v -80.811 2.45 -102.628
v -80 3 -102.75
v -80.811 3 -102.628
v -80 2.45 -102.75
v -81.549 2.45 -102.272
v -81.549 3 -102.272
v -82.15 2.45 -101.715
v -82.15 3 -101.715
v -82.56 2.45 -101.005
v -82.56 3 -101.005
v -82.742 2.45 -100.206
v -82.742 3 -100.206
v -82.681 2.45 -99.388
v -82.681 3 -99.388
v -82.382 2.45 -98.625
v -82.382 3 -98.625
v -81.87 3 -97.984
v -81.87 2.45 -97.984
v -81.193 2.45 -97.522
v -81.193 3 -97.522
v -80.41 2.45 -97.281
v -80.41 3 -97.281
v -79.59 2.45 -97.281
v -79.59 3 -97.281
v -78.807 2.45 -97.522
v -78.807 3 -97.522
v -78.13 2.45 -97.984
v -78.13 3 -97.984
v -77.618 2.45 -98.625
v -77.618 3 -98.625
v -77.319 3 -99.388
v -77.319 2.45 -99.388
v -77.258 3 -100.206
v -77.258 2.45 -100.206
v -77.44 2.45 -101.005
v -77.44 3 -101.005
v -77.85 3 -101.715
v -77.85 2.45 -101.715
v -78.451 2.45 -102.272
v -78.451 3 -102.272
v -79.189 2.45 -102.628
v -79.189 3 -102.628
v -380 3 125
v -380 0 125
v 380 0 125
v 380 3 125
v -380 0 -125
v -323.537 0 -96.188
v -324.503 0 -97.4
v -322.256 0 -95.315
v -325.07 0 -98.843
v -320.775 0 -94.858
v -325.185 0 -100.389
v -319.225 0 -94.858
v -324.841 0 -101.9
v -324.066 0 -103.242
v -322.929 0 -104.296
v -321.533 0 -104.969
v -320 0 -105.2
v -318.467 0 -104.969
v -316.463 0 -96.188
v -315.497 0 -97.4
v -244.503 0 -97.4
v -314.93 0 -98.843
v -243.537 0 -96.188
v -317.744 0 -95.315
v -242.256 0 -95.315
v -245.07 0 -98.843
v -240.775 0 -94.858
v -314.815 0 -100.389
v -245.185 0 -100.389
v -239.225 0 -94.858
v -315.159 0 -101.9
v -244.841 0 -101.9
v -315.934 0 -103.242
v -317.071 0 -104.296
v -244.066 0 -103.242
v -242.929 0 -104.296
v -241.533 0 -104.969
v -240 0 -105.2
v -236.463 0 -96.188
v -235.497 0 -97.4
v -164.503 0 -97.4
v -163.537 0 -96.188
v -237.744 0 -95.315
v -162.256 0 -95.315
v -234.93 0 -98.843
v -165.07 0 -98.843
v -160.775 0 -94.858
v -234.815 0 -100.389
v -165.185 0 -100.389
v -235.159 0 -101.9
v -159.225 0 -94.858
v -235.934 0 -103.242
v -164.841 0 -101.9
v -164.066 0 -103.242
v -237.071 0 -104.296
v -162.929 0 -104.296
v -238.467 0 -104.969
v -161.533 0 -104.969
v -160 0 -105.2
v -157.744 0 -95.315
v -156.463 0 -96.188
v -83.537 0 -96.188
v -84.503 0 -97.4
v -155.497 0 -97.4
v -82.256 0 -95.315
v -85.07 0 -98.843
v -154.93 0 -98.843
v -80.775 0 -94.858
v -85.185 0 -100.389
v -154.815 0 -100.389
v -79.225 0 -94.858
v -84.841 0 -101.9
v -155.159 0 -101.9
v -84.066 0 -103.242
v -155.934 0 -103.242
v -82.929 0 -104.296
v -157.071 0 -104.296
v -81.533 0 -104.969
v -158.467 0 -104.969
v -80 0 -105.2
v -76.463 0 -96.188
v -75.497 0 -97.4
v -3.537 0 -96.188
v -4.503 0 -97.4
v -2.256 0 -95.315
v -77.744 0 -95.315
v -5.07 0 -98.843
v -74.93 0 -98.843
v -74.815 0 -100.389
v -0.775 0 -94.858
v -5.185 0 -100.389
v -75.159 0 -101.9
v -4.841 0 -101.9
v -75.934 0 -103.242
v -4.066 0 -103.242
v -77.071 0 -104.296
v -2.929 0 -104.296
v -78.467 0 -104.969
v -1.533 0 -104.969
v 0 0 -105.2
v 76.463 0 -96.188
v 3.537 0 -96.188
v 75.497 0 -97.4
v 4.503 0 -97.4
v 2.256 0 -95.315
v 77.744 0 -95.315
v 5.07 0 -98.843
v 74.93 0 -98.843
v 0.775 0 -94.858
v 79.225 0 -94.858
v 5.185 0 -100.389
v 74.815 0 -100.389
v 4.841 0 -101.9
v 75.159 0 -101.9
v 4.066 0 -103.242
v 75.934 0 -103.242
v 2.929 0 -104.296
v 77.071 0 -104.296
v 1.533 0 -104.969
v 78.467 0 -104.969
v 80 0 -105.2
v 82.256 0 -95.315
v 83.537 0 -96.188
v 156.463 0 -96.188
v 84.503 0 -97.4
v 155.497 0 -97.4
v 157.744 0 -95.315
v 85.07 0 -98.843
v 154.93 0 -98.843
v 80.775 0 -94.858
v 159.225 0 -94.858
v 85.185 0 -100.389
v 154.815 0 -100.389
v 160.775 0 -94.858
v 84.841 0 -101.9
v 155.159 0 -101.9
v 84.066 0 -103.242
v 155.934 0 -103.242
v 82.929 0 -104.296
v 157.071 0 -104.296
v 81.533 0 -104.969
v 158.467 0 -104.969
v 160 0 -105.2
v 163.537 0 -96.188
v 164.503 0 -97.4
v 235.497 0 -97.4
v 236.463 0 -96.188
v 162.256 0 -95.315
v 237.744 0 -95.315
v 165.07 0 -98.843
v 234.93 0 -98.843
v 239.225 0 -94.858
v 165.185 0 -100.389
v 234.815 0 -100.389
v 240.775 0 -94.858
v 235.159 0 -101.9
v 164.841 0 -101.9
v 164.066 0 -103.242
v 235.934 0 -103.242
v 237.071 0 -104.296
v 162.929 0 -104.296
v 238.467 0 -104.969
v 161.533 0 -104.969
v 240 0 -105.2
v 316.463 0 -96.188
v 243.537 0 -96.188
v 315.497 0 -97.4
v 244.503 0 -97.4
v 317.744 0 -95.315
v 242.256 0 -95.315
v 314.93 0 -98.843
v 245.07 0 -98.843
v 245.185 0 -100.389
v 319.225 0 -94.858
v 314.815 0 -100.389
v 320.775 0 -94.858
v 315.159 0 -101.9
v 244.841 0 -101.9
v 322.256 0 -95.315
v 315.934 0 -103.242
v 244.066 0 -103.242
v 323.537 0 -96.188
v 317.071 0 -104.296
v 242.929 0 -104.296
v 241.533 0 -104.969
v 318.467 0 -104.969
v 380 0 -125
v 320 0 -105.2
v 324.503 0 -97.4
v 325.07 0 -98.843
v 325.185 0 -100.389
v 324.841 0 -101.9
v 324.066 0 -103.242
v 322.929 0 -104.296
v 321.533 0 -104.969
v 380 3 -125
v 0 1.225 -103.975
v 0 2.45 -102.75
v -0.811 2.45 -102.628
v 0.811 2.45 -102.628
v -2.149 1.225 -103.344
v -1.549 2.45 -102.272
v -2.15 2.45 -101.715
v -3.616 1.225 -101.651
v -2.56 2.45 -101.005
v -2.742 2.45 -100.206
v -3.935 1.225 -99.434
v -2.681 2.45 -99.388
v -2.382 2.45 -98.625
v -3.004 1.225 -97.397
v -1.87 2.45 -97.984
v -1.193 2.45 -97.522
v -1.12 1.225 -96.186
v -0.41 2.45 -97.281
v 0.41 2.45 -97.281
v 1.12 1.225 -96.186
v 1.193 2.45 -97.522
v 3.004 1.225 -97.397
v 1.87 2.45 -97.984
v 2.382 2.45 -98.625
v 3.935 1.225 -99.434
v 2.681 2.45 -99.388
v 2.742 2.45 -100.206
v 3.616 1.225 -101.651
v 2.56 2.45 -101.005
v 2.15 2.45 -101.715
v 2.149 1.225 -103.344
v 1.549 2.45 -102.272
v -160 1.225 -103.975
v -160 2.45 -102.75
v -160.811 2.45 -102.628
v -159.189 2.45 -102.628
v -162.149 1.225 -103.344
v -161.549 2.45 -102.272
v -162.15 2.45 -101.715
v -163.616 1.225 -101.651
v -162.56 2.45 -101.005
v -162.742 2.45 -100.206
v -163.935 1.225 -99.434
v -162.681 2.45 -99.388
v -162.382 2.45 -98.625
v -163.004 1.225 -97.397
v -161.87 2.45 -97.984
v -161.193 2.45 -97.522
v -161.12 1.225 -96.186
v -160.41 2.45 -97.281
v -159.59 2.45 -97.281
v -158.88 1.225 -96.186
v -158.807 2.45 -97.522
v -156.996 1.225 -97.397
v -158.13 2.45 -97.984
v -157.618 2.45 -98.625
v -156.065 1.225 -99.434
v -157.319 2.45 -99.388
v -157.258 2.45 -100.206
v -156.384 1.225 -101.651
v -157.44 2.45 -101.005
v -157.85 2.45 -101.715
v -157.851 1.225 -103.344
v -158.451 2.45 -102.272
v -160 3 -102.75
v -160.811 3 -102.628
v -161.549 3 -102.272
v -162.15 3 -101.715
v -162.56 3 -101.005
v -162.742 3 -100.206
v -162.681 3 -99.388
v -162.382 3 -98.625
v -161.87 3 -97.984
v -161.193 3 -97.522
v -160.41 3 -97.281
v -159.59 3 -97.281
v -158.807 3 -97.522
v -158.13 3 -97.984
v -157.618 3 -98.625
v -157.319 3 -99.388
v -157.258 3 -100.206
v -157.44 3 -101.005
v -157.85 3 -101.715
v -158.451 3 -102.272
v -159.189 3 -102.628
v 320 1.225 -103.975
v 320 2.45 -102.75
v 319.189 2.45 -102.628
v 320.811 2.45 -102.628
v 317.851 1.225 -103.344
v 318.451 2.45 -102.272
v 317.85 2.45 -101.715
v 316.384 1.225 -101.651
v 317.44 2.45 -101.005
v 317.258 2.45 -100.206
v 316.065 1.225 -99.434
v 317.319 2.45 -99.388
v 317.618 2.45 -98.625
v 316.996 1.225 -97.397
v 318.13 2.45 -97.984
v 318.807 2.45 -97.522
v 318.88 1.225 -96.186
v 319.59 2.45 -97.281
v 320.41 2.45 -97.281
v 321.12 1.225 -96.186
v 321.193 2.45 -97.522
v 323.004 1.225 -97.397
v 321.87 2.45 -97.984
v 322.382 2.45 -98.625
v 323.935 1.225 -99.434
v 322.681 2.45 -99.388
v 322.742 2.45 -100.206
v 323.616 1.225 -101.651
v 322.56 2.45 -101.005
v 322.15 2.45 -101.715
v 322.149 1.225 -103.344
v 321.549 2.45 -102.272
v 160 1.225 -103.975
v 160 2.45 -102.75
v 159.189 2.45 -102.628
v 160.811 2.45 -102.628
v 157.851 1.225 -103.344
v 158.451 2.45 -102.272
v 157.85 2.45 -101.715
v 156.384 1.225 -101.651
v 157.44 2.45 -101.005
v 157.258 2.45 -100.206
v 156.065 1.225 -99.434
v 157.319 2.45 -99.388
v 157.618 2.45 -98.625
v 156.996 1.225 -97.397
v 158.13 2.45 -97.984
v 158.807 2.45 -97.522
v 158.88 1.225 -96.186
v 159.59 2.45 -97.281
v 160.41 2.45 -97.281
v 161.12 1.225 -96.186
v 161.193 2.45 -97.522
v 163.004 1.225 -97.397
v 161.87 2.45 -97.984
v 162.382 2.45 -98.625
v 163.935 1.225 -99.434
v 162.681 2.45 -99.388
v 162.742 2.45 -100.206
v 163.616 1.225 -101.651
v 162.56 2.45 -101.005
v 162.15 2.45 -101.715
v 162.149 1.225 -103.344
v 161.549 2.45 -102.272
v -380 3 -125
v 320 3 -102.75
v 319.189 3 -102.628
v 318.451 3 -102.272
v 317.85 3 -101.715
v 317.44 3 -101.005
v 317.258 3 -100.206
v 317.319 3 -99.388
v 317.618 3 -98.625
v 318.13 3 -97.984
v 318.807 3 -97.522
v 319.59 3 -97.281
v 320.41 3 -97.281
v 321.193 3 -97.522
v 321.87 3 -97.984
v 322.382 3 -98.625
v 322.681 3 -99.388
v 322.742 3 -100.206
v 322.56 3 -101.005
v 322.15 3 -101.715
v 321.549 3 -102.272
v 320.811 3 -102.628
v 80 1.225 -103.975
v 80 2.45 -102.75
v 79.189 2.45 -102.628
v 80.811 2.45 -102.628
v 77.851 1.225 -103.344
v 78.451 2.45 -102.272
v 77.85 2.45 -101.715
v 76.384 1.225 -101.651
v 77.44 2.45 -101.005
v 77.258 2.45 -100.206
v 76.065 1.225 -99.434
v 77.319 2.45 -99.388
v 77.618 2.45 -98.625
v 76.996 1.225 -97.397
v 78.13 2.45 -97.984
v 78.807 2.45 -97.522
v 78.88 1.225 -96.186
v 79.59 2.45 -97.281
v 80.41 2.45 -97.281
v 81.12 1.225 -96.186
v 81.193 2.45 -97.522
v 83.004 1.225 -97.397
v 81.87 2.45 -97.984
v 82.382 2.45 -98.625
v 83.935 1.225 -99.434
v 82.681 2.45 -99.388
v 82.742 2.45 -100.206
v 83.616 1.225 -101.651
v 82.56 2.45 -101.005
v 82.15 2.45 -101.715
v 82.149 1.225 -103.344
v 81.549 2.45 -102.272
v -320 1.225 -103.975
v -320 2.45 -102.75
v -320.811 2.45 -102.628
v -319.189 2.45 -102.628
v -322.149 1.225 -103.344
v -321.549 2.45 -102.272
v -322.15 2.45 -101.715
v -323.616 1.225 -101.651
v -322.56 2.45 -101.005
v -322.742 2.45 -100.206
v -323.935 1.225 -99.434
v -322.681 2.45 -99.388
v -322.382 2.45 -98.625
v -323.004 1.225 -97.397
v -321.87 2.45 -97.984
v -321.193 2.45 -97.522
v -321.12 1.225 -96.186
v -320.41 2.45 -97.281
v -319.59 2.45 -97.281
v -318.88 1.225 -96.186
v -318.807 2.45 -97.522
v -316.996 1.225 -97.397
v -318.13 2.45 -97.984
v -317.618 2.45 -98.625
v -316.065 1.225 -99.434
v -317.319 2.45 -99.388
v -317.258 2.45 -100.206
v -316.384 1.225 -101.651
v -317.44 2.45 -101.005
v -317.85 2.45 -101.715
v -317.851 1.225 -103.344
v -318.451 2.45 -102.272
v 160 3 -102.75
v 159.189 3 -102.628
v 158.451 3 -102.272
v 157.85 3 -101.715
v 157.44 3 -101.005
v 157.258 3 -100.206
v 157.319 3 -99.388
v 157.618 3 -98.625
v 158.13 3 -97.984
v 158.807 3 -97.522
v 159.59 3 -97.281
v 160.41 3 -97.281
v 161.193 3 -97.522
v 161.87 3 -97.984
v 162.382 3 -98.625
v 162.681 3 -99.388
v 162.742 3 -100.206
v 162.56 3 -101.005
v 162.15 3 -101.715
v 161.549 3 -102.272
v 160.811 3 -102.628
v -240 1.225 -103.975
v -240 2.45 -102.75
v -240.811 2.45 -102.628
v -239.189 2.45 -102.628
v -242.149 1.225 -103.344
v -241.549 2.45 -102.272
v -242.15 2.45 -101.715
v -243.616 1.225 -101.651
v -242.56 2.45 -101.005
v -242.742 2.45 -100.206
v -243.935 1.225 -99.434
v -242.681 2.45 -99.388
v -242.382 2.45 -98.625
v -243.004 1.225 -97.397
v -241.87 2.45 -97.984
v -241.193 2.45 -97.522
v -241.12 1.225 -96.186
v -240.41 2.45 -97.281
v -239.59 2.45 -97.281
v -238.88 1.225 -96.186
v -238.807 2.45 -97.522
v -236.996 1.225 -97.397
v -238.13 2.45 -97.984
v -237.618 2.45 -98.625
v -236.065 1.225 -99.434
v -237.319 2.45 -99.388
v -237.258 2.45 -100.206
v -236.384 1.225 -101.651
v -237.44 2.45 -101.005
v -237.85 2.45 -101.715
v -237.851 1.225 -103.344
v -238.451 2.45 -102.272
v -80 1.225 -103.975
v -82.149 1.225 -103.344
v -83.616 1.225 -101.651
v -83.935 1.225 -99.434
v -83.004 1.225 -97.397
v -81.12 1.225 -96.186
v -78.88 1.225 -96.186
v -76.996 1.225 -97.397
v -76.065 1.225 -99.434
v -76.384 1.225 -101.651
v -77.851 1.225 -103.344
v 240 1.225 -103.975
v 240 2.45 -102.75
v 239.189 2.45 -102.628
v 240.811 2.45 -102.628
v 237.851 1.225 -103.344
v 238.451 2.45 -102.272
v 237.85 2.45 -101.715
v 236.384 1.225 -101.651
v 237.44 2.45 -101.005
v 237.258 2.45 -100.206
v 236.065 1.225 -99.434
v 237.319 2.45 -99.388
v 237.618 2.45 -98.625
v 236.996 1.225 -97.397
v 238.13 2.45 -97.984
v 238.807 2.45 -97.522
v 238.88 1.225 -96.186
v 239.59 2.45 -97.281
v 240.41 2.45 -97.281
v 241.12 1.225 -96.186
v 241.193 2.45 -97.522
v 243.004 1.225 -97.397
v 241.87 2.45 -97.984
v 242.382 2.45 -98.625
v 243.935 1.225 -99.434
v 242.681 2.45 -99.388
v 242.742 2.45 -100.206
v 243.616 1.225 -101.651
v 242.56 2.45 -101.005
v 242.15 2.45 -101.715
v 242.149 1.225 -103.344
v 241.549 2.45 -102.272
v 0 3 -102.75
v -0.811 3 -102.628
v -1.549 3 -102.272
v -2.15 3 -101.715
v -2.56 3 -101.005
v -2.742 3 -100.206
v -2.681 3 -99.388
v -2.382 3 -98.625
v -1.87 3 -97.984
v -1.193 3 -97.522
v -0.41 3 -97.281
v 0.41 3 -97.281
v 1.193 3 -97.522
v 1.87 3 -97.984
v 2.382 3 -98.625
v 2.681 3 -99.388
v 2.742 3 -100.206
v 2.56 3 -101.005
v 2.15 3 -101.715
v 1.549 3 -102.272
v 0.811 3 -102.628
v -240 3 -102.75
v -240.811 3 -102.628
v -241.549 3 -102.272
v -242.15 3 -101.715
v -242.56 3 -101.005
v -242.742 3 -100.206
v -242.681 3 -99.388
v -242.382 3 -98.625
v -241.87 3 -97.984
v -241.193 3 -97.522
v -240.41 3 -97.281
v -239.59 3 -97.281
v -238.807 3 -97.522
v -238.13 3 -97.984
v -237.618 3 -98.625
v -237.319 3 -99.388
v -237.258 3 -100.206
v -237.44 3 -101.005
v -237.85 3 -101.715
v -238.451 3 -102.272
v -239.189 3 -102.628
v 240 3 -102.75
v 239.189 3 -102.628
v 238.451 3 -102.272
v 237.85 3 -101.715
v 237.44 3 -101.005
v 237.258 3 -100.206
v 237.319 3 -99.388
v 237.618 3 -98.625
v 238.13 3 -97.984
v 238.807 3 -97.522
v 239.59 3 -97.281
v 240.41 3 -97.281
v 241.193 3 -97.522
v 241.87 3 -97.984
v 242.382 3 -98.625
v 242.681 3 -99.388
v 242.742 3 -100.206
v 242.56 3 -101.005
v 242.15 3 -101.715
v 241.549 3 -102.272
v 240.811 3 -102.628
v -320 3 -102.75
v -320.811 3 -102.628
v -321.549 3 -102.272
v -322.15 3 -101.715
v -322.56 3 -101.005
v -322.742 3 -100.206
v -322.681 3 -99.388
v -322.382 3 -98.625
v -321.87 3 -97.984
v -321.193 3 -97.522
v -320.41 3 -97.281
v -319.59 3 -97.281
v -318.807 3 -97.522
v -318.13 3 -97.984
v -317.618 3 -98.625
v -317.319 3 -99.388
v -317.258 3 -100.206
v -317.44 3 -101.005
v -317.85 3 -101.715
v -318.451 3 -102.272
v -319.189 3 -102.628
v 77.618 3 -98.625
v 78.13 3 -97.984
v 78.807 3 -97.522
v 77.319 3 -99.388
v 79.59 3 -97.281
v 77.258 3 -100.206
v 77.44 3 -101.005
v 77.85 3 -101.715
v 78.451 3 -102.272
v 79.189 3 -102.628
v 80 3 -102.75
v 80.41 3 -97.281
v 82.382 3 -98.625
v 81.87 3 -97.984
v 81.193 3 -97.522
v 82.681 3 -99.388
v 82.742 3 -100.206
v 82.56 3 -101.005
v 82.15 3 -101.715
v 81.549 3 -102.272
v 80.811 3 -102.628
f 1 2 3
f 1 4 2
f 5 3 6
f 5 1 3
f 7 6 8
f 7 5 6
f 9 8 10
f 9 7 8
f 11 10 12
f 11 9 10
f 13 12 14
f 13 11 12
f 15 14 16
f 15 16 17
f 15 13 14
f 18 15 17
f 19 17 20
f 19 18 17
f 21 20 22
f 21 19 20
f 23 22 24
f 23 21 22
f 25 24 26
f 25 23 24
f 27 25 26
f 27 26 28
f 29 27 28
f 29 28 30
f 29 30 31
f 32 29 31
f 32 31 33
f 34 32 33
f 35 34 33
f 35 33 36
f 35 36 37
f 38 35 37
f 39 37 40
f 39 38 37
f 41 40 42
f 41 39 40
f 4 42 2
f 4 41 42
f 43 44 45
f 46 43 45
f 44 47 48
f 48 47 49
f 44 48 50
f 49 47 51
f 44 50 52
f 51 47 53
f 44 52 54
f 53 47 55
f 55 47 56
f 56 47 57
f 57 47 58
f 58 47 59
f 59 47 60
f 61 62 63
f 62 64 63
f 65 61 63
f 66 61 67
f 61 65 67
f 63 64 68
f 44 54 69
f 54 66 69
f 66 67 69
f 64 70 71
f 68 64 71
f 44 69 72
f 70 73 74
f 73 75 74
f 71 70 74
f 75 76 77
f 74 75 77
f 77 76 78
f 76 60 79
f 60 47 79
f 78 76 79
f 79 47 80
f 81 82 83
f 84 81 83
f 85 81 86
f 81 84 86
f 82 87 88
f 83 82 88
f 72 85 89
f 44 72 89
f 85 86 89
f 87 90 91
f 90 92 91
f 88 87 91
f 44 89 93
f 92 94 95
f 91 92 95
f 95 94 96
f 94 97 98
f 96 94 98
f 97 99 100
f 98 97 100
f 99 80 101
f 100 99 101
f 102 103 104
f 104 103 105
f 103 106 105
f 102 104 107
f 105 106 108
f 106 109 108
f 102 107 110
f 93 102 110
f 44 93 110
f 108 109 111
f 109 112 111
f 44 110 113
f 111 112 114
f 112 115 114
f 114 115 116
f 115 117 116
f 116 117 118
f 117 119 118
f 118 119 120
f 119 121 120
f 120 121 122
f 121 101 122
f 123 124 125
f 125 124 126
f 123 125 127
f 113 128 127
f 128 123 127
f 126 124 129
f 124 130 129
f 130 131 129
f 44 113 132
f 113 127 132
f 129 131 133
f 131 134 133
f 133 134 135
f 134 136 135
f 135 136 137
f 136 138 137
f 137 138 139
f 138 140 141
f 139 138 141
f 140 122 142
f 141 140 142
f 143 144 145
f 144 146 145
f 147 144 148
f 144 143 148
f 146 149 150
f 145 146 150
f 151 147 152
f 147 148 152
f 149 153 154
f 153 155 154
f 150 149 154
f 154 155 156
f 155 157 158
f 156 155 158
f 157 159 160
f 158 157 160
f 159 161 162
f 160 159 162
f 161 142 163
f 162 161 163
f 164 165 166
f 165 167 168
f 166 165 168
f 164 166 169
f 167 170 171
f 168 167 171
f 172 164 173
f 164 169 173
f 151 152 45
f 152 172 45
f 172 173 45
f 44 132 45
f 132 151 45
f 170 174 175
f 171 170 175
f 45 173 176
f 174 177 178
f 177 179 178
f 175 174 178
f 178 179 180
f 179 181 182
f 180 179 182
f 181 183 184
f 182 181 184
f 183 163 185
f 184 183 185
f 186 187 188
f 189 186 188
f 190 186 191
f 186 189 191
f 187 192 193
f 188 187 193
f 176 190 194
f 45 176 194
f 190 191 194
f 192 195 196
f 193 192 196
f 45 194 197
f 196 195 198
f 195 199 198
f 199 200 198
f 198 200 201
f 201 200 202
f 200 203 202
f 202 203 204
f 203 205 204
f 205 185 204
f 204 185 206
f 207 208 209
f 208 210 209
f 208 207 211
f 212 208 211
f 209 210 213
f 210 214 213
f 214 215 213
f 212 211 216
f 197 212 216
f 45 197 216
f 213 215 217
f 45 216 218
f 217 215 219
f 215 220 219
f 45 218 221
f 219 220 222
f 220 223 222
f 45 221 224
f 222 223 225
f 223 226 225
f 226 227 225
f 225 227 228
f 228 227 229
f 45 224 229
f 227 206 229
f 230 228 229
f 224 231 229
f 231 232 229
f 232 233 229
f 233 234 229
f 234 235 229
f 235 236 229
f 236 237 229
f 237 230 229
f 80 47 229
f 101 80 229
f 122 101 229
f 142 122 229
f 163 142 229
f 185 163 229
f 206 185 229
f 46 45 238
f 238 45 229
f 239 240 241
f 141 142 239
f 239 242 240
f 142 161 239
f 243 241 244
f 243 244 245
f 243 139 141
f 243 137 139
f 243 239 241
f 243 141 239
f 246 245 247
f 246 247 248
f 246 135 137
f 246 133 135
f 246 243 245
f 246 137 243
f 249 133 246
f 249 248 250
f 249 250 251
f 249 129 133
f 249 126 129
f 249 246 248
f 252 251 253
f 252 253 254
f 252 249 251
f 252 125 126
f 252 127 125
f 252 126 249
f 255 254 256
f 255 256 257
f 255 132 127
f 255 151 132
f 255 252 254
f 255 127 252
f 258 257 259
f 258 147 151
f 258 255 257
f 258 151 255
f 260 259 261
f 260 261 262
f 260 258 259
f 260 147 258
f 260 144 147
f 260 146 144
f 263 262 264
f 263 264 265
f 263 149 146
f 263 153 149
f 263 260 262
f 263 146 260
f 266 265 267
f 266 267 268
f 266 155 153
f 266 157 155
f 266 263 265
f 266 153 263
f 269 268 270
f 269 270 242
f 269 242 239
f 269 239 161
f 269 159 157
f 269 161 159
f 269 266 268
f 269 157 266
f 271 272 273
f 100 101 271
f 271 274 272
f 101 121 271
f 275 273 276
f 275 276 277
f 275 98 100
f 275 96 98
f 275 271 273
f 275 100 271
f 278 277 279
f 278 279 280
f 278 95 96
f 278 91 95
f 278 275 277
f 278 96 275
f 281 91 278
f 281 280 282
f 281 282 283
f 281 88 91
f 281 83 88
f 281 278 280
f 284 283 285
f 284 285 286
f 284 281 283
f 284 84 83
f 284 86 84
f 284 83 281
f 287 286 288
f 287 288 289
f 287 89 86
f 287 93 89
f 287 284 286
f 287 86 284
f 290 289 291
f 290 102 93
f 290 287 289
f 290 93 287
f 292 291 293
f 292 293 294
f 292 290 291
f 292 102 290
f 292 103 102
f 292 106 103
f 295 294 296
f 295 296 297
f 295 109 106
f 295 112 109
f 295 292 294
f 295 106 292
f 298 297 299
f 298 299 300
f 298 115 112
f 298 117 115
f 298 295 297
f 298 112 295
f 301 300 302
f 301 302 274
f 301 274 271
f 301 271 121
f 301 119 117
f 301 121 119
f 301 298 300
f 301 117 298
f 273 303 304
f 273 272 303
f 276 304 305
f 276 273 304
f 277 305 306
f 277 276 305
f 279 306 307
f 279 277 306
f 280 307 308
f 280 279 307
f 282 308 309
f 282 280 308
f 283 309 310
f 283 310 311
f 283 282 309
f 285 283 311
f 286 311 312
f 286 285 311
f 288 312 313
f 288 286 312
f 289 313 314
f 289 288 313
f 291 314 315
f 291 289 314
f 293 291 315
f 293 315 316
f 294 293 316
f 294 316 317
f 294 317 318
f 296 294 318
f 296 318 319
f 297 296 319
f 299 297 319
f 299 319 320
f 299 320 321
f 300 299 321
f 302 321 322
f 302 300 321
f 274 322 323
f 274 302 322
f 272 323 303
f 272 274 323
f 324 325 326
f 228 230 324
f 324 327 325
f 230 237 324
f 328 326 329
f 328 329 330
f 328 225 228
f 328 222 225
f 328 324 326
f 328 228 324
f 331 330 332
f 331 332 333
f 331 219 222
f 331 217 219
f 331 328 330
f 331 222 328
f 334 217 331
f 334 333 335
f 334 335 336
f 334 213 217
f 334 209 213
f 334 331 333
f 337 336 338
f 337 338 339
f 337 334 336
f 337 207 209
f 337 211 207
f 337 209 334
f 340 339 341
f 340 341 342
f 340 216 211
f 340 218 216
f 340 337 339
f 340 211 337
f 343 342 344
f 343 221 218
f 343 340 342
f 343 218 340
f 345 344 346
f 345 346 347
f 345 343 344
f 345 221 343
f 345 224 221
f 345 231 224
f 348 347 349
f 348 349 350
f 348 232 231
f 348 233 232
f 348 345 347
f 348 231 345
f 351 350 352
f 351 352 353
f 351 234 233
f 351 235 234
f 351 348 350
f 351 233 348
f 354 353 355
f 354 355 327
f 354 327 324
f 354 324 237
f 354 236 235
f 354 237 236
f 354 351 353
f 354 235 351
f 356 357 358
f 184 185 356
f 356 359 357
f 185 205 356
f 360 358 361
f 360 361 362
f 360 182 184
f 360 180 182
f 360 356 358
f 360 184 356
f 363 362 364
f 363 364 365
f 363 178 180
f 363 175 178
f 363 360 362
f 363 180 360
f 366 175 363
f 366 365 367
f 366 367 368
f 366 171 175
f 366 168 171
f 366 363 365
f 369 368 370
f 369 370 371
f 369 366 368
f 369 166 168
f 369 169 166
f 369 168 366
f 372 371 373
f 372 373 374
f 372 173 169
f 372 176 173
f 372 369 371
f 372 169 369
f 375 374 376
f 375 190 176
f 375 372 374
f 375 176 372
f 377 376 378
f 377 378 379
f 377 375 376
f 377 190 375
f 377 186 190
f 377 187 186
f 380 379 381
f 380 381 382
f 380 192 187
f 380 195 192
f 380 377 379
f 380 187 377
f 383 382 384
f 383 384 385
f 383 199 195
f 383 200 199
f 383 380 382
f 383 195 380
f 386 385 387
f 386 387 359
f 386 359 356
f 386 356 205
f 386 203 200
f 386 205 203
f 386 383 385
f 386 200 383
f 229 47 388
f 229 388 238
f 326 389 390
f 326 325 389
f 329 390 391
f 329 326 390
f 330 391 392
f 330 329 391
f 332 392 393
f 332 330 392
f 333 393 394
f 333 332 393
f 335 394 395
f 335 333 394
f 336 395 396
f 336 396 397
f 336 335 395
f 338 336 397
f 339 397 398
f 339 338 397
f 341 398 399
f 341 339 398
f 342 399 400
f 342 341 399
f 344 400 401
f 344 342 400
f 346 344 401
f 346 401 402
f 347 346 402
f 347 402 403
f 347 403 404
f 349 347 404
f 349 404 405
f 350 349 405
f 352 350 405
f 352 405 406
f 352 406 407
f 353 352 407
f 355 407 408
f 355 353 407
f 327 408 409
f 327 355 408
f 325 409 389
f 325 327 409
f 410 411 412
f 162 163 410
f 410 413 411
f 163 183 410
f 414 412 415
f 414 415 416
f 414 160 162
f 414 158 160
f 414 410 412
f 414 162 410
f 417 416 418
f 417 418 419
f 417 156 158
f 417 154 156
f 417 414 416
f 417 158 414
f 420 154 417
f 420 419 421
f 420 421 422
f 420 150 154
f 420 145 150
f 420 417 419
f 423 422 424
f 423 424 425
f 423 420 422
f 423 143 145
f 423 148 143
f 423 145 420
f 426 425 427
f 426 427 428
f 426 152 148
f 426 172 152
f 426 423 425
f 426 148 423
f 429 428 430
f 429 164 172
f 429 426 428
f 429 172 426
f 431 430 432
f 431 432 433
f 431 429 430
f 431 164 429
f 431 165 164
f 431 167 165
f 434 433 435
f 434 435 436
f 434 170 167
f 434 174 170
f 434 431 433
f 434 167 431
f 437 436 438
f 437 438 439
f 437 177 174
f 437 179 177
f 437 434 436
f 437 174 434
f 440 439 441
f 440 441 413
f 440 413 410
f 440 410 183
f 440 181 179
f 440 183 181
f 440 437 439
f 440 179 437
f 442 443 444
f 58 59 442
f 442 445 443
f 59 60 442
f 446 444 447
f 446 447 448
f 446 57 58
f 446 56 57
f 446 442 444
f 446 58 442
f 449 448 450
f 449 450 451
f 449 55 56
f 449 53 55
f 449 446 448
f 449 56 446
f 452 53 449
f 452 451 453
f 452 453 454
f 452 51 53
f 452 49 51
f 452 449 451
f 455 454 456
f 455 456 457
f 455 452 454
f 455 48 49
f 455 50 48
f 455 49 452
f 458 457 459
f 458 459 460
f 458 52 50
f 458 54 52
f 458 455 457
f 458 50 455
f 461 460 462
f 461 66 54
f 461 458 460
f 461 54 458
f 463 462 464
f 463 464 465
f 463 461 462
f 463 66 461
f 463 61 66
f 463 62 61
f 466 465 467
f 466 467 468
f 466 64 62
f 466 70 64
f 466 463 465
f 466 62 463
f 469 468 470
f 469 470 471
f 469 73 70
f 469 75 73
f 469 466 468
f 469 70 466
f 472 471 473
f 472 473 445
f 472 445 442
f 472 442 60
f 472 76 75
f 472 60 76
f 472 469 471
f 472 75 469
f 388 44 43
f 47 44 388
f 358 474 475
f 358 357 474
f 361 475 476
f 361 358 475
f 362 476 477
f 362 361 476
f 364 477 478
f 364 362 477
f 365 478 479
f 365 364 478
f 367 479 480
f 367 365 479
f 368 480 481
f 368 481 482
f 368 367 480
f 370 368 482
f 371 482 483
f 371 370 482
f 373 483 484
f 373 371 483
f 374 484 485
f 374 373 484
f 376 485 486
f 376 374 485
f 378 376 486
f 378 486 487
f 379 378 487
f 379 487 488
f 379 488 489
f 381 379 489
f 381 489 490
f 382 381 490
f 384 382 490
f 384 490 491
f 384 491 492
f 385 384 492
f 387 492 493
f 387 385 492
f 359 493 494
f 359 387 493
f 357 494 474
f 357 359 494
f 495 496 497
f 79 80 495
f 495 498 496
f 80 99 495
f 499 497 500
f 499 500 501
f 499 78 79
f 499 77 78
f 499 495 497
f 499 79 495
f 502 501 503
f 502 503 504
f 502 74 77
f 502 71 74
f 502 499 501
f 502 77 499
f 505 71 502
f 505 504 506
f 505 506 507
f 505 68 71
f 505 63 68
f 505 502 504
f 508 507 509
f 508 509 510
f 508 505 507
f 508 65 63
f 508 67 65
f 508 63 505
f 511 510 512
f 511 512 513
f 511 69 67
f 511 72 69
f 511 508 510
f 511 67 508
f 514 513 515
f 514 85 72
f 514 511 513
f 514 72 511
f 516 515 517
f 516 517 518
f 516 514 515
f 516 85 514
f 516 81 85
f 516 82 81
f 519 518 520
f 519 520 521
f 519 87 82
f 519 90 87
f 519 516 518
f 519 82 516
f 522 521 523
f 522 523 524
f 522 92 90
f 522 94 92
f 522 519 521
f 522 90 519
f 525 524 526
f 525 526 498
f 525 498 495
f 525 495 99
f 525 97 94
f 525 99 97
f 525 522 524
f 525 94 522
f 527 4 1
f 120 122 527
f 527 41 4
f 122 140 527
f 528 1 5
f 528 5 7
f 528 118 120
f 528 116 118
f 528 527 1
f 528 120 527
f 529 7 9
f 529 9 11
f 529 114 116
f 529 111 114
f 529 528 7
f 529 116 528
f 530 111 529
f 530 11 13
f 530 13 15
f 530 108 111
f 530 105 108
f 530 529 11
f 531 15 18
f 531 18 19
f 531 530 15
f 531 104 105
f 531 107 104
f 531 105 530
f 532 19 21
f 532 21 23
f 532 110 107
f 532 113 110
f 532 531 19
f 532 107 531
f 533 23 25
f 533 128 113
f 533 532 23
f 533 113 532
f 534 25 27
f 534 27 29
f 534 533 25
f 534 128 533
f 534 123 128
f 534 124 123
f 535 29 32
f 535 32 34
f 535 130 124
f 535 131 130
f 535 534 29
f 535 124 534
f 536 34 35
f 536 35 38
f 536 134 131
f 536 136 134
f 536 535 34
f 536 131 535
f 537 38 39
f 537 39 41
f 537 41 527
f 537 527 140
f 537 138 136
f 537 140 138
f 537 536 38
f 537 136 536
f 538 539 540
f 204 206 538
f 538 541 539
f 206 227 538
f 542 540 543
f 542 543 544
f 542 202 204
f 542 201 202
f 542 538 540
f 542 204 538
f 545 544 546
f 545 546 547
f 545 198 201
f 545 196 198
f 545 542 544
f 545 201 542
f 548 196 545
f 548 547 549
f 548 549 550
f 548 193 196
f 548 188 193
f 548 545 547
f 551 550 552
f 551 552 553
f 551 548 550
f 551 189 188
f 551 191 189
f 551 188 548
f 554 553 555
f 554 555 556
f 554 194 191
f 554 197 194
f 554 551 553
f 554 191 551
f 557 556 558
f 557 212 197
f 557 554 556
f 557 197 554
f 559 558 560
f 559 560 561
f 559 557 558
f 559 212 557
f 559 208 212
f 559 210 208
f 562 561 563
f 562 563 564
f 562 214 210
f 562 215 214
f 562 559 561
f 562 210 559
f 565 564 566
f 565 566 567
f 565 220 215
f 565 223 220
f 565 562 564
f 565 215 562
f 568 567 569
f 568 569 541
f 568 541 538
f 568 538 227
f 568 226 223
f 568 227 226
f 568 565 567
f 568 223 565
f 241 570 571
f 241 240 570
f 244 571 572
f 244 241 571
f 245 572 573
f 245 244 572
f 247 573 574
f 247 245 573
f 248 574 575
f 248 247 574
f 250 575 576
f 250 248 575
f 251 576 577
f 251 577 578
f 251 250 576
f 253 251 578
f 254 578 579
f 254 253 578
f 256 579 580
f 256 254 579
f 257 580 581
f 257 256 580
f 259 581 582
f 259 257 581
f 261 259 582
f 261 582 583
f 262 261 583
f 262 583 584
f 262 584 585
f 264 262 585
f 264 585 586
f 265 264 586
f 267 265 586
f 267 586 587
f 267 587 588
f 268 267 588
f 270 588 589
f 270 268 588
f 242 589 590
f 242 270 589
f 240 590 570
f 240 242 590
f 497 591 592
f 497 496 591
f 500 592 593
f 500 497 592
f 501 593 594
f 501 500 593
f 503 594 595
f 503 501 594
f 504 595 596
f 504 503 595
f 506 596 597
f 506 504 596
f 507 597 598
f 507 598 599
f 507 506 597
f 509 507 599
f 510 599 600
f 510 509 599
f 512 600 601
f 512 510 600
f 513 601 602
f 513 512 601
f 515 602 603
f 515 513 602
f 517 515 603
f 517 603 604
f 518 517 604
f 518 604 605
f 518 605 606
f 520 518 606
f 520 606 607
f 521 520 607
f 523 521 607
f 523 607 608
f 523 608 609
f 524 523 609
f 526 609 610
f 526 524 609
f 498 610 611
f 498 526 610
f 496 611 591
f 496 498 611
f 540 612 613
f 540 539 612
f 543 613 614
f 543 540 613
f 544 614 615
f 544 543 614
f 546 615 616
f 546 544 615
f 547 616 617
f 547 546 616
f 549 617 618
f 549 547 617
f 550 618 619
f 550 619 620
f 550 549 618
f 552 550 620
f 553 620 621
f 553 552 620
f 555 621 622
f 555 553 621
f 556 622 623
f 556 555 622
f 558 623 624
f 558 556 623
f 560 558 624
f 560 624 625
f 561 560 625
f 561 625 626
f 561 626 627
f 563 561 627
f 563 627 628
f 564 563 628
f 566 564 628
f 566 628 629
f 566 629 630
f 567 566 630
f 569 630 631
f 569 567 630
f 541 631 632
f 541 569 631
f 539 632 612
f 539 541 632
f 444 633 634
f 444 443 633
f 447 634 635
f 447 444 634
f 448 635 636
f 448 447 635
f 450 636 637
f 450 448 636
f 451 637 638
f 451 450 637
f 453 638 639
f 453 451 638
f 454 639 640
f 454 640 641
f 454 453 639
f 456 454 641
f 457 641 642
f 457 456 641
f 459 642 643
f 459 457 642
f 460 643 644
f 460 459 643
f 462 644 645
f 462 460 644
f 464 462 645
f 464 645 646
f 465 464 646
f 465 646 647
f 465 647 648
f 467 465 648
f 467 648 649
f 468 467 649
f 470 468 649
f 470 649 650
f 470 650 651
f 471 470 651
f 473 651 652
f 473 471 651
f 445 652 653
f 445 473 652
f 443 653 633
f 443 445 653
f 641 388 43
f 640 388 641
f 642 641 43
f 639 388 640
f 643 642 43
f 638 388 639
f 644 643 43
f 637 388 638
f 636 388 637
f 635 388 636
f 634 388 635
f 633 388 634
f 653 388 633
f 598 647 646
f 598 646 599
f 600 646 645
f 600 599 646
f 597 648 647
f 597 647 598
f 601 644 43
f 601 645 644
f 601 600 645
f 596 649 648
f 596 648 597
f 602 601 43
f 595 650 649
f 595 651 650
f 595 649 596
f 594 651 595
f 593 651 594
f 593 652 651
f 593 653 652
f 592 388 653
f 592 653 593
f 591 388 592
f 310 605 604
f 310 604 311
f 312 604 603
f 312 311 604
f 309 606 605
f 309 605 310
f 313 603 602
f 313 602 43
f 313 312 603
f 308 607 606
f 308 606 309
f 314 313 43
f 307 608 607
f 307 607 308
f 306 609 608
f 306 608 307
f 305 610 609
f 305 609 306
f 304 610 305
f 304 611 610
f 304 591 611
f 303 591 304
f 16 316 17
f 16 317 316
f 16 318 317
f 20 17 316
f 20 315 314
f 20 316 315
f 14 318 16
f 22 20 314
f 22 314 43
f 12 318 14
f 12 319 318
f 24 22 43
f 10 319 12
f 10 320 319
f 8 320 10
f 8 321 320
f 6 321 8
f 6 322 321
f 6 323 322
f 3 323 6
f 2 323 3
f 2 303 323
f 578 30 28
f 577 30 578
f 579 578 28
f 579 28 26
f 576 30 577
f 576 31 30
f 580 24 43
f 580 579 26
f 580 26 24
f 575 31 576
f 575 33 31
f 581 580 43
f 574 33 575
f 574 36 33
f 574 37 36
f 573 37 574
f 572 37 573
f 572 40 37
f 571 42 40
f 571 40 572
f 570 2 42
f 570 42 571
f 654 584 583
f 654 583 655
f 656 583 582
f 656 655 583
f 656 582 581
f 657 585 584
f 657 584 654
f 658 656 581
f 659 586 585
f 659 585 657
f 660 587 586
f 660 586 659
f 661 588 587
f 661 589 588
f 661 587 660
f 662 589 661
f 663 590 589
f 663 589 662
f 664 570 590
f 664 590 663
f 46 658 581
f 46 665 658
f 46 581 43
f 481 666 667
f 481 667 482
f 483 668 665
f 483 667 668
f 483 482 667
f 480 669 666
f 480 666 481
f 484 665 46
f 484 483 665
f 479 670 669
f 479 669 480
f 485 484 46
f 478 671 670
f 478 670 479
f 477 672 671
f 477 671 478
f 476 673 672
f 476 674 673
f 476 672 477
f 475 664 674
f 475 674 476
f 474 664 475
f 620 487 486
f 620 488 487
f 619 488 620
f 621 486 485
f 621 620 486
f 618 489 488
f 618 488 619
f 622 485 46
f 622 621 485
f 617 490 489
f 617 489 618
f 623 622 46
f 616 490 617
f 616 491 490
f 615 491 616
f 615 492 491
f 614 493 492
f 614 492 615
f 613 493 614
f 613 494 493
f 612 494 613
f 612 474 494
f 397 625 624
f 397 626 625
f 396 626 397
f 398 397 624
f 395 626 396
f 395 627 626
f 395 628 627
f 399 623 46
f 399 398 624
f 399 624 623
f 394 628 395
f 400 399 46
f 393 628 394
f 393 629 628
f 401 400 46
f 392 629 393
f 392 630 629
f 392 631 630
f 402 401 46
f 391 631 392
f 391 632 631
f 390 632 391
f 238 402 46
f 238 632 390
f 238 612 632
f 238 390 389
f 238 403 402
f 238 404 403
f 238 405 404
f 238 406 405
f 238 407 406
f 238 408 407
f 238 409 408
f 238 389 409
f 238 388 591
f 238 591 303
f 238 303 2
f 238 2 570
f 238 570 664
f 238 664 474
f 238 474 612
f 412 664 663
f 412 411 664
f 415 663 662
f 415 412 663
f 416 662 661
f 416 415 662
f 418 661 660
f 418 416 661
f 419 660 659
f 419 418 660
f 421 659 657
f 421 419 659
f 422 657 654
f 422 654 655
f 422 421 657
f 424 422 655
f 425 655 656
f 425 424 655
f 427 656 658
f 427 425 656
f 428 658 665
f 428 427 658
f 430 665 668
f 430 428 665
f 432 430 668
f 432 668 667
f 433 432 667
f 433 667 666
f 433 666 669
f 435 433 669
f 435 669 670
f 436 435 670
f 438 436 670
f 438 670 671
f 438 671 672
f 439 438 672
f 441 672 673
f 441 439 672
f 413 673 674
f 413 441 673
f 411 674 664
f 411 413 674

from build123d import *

# Parameters (mm, degrees)
SKETCH1_W                                    = 760
SKETCH1_H                                    = 250
BOSS_EXTRUDE1_DEPTH                          = 3
CSK_FOR_M5_COUNTERSUNK_FLAT_HEAD_SCR_2_COUNT = 2
CSK_FOR_M5_COUNTERSUNK_FLAT_HEAD_SCR_2_PITCH = 80
CSK_FOR_M5_COUNTERSUNK_FLAT_HEAD_SCR_3_COUNT = 2
CSK_FOR_M5_COUNTERSUNK_FLAT_HEAD_SCR_3_PITCH = 160
CSK_FOR_M5_COUNTERSUNK_FLAT_HEAD_SCR_4_COUNT = 2
CSK_FOR_M5_COUNTERSUNK_FLAT_HEAD_SCR_4_PITCH = 240
CSK_FOR_M5_COUNTERSUNK_FLAT_HEAD_SCR_5_COUNT = 2
CSK_FOR_M5_COUNTERSUNK_FLAT_HEAD_SCR_5_PITCH = 320
CSK_FOR_M5_COUNTERSUNK_FLAT_HEAD_SCR_6_COUNT = 2
CSK_FOR_M5_COUNTERSUNK_FLAT_HEAD_SCR_6_PITCH = 80
CSK_FOR_M5_COUNTERSUNK_FLAT_HEAD_SCR_7_COUNT = 2
CSK_FOR_M5_COUNTERSUNK_FLAT_HEAD_SCR_7_PITCH = 160
CSK_FOR_M5_COUNTERSUNK_FLAT_HEAD_SCR_8_COUNT = 2
CSK_FOR_M5_COUNTERSUNK_FLAT_HEAD_SCR_8_PITCH = 240
CSK_FOR_M5_COUNTERSUNK_FLAT_HEAD_SCR_9_COUNT = 2
CSK_FOR_M5_COUNTERSUNK_FLAT_HEAD_SCR_9_PITCH = 320


with BuildPart() as part:
    # Sketch1 → Boss-Extrude1 (new body)
    with BuildSketch(Plane(origin=(0, 0, 0), x_dir=(1, 0, 0), z_dir=(0, 1, 0))):
        Rectangle(SKETCH1_W, SKETCH1_H)
    extrude(amount=BOSS_EXTRUDE1_DEPTH)

    # Sketch3 → CSK for M5 Countersunk Flat Head Screw1 (revolve, cut)
    with BuildSketch(Plane(origin=(0, 0, -100), x_dir=(0, 0, -1), z_dir=(1, 0, 0))):
        Polygon((0, 0), (0, 3), (2.75, 3), (2.75, 2.45), (5.2, 0), align=None)
    csk_for_m5_countersunk_flat_head_screw1 = revolve(axis=Axis((0, -6.35, -100), (0, 1, 0)), mode=Mode.SUBTRACT)

    # CSK for M5 Countersunk Flat Head Scr 2: CSK for M5 Countersunk Flat Head Screw1 ×2
    with Locations(*[(-i * CSK_FOR_M5_COUNTERSUNK_FLAT_HEAD_SCR_2_PITCH, 0, 0) for i in range(1, CSK_FOR_M5_COUNTERSUNK_FLAT_HEAD_SCR_2_COUNT)]):
        add(csk_for_m5_countersunk_flat_head_screw1, mode=Mode.SUBTRACT)

    # CSK for M5 Countersunk Flat Head Scr 3: CSK for M5 Countersunk Flat Head Screw1 ×2
    with Locations(*[(-i * CSK_FOR_M5_COUNTERSUNK_FLAT_HEAD_SCR_3_PITCH, 0, 0) for i in range(1, CSK_FOR_M5_COUNTERSUNK_FLAT_HEAD_SCR_3_COUNT)]):
        add(csk_for_m5_countersunk_flat_head_screw1, mode=Mode.SUBTRACT)

    # CSK for M5 Countersunk Flat Head Scr 4: CSK for M5 Countersunk Flat Head Screw1 ×2
    with Locations(*[(-i * CSK_FOR_M5_COUNTERSUNK_FLAT_HEAD_SCR_4_PITCH, 0, 0) for i in range(1, CSK_FOR_M5_COUNTERSUNK_FLAT_HEAD_SCR_4_COUNT)]):
        add(csk_for_m5_countersunk_flat_head_screw1, mode=Mode.SUBTRACT)

    # CSK for M5 Countersunk Flat Head Scr 5: CSK for M5 Countersunk Flat Head Screw1 ×2
    with Locations(*[(-i * CSK_FOR_M5_COUNTERSUNK_FLAT_HEAD_SCR_5_PITCH, 0, 0) for i in range(1, CSK_FOR_M5_COUNTERSUNK_FLAT_HEAD_SCR_5_COUNT)]):
        add(csk_for_m5_countersunk_flat_head_screw1, mode=Mode.SUBTRACT)

    # CSK for M5 Countersunk Flat Head Scr 6: CSK for M5 Countersunk Flat Head Screw1 ×2
    with Locations(*[(i * CSK_FOR_M5_COUNTERSUNK_FLAT_HEAD_SCR_6_PITCH, 0, 0) for i in range(1, CSK_FOR_M5_COUNTERSUNK_FLAT_HEAD_SCR_6_COUNT)]):
        add(csk_for_m5_countersunk_flat_head_screw1, mode=Mode.SUBTRACT)

    # CSK for M5 Countersunk Flat Head Scr 7: CSK for M5 Countersunk Flat Head Screw1 ×2
    with Locations(*[(i * CSK_FOR_M5_COUNTERSUNK_FLAT_HEAD_SCR_7_PITCH, 0, 0) for i in range(1, CSK_FOR_M5_COUNTERSUNK_FLAT_HEAD_SCR_7_COUNT)]):
        add(csk_for_m5_countersunk_flat_head_screw1, mode=Mode.SUBTRACT)

    # CSK for M5 Countersunk Flat Head Scr 8: CSK for M5 Countersunk Flat Head Screw1 ×2
    with Locations(*[(i * CSK_FOR_M5_COUNTERSUNK_FLAT_HEAD_SCR_8_PITCH, 0, 0) for i in range(1, CSK_FOR_M5_COUNTERSUNK_FLAT_HEAD_SCR_8_COUNT)]):
        add(csk_for_m5_countersunk_flat_head_screw1, mode=Mode.SUBTRACT)

    # CSK for M5 Countersunk Flat Head Scr 9: CSK for M5 Countersunk Flat Head Screw1 ×2
    with Locations(*[(i * CSK_FOR_M5_COUNTERSUNK_FLAT_HEAD_SCR_9_PITCH, 0, 0) for i in range(1, CSK_FOR_M5_COUNTERSUNK_FLAT_HEAD_SCR_9_COUNT)]):
        add(csk_for_m5_countersunk_flat_head_screw1, mode=Mode.SUBTRACT)


solid = part.part
